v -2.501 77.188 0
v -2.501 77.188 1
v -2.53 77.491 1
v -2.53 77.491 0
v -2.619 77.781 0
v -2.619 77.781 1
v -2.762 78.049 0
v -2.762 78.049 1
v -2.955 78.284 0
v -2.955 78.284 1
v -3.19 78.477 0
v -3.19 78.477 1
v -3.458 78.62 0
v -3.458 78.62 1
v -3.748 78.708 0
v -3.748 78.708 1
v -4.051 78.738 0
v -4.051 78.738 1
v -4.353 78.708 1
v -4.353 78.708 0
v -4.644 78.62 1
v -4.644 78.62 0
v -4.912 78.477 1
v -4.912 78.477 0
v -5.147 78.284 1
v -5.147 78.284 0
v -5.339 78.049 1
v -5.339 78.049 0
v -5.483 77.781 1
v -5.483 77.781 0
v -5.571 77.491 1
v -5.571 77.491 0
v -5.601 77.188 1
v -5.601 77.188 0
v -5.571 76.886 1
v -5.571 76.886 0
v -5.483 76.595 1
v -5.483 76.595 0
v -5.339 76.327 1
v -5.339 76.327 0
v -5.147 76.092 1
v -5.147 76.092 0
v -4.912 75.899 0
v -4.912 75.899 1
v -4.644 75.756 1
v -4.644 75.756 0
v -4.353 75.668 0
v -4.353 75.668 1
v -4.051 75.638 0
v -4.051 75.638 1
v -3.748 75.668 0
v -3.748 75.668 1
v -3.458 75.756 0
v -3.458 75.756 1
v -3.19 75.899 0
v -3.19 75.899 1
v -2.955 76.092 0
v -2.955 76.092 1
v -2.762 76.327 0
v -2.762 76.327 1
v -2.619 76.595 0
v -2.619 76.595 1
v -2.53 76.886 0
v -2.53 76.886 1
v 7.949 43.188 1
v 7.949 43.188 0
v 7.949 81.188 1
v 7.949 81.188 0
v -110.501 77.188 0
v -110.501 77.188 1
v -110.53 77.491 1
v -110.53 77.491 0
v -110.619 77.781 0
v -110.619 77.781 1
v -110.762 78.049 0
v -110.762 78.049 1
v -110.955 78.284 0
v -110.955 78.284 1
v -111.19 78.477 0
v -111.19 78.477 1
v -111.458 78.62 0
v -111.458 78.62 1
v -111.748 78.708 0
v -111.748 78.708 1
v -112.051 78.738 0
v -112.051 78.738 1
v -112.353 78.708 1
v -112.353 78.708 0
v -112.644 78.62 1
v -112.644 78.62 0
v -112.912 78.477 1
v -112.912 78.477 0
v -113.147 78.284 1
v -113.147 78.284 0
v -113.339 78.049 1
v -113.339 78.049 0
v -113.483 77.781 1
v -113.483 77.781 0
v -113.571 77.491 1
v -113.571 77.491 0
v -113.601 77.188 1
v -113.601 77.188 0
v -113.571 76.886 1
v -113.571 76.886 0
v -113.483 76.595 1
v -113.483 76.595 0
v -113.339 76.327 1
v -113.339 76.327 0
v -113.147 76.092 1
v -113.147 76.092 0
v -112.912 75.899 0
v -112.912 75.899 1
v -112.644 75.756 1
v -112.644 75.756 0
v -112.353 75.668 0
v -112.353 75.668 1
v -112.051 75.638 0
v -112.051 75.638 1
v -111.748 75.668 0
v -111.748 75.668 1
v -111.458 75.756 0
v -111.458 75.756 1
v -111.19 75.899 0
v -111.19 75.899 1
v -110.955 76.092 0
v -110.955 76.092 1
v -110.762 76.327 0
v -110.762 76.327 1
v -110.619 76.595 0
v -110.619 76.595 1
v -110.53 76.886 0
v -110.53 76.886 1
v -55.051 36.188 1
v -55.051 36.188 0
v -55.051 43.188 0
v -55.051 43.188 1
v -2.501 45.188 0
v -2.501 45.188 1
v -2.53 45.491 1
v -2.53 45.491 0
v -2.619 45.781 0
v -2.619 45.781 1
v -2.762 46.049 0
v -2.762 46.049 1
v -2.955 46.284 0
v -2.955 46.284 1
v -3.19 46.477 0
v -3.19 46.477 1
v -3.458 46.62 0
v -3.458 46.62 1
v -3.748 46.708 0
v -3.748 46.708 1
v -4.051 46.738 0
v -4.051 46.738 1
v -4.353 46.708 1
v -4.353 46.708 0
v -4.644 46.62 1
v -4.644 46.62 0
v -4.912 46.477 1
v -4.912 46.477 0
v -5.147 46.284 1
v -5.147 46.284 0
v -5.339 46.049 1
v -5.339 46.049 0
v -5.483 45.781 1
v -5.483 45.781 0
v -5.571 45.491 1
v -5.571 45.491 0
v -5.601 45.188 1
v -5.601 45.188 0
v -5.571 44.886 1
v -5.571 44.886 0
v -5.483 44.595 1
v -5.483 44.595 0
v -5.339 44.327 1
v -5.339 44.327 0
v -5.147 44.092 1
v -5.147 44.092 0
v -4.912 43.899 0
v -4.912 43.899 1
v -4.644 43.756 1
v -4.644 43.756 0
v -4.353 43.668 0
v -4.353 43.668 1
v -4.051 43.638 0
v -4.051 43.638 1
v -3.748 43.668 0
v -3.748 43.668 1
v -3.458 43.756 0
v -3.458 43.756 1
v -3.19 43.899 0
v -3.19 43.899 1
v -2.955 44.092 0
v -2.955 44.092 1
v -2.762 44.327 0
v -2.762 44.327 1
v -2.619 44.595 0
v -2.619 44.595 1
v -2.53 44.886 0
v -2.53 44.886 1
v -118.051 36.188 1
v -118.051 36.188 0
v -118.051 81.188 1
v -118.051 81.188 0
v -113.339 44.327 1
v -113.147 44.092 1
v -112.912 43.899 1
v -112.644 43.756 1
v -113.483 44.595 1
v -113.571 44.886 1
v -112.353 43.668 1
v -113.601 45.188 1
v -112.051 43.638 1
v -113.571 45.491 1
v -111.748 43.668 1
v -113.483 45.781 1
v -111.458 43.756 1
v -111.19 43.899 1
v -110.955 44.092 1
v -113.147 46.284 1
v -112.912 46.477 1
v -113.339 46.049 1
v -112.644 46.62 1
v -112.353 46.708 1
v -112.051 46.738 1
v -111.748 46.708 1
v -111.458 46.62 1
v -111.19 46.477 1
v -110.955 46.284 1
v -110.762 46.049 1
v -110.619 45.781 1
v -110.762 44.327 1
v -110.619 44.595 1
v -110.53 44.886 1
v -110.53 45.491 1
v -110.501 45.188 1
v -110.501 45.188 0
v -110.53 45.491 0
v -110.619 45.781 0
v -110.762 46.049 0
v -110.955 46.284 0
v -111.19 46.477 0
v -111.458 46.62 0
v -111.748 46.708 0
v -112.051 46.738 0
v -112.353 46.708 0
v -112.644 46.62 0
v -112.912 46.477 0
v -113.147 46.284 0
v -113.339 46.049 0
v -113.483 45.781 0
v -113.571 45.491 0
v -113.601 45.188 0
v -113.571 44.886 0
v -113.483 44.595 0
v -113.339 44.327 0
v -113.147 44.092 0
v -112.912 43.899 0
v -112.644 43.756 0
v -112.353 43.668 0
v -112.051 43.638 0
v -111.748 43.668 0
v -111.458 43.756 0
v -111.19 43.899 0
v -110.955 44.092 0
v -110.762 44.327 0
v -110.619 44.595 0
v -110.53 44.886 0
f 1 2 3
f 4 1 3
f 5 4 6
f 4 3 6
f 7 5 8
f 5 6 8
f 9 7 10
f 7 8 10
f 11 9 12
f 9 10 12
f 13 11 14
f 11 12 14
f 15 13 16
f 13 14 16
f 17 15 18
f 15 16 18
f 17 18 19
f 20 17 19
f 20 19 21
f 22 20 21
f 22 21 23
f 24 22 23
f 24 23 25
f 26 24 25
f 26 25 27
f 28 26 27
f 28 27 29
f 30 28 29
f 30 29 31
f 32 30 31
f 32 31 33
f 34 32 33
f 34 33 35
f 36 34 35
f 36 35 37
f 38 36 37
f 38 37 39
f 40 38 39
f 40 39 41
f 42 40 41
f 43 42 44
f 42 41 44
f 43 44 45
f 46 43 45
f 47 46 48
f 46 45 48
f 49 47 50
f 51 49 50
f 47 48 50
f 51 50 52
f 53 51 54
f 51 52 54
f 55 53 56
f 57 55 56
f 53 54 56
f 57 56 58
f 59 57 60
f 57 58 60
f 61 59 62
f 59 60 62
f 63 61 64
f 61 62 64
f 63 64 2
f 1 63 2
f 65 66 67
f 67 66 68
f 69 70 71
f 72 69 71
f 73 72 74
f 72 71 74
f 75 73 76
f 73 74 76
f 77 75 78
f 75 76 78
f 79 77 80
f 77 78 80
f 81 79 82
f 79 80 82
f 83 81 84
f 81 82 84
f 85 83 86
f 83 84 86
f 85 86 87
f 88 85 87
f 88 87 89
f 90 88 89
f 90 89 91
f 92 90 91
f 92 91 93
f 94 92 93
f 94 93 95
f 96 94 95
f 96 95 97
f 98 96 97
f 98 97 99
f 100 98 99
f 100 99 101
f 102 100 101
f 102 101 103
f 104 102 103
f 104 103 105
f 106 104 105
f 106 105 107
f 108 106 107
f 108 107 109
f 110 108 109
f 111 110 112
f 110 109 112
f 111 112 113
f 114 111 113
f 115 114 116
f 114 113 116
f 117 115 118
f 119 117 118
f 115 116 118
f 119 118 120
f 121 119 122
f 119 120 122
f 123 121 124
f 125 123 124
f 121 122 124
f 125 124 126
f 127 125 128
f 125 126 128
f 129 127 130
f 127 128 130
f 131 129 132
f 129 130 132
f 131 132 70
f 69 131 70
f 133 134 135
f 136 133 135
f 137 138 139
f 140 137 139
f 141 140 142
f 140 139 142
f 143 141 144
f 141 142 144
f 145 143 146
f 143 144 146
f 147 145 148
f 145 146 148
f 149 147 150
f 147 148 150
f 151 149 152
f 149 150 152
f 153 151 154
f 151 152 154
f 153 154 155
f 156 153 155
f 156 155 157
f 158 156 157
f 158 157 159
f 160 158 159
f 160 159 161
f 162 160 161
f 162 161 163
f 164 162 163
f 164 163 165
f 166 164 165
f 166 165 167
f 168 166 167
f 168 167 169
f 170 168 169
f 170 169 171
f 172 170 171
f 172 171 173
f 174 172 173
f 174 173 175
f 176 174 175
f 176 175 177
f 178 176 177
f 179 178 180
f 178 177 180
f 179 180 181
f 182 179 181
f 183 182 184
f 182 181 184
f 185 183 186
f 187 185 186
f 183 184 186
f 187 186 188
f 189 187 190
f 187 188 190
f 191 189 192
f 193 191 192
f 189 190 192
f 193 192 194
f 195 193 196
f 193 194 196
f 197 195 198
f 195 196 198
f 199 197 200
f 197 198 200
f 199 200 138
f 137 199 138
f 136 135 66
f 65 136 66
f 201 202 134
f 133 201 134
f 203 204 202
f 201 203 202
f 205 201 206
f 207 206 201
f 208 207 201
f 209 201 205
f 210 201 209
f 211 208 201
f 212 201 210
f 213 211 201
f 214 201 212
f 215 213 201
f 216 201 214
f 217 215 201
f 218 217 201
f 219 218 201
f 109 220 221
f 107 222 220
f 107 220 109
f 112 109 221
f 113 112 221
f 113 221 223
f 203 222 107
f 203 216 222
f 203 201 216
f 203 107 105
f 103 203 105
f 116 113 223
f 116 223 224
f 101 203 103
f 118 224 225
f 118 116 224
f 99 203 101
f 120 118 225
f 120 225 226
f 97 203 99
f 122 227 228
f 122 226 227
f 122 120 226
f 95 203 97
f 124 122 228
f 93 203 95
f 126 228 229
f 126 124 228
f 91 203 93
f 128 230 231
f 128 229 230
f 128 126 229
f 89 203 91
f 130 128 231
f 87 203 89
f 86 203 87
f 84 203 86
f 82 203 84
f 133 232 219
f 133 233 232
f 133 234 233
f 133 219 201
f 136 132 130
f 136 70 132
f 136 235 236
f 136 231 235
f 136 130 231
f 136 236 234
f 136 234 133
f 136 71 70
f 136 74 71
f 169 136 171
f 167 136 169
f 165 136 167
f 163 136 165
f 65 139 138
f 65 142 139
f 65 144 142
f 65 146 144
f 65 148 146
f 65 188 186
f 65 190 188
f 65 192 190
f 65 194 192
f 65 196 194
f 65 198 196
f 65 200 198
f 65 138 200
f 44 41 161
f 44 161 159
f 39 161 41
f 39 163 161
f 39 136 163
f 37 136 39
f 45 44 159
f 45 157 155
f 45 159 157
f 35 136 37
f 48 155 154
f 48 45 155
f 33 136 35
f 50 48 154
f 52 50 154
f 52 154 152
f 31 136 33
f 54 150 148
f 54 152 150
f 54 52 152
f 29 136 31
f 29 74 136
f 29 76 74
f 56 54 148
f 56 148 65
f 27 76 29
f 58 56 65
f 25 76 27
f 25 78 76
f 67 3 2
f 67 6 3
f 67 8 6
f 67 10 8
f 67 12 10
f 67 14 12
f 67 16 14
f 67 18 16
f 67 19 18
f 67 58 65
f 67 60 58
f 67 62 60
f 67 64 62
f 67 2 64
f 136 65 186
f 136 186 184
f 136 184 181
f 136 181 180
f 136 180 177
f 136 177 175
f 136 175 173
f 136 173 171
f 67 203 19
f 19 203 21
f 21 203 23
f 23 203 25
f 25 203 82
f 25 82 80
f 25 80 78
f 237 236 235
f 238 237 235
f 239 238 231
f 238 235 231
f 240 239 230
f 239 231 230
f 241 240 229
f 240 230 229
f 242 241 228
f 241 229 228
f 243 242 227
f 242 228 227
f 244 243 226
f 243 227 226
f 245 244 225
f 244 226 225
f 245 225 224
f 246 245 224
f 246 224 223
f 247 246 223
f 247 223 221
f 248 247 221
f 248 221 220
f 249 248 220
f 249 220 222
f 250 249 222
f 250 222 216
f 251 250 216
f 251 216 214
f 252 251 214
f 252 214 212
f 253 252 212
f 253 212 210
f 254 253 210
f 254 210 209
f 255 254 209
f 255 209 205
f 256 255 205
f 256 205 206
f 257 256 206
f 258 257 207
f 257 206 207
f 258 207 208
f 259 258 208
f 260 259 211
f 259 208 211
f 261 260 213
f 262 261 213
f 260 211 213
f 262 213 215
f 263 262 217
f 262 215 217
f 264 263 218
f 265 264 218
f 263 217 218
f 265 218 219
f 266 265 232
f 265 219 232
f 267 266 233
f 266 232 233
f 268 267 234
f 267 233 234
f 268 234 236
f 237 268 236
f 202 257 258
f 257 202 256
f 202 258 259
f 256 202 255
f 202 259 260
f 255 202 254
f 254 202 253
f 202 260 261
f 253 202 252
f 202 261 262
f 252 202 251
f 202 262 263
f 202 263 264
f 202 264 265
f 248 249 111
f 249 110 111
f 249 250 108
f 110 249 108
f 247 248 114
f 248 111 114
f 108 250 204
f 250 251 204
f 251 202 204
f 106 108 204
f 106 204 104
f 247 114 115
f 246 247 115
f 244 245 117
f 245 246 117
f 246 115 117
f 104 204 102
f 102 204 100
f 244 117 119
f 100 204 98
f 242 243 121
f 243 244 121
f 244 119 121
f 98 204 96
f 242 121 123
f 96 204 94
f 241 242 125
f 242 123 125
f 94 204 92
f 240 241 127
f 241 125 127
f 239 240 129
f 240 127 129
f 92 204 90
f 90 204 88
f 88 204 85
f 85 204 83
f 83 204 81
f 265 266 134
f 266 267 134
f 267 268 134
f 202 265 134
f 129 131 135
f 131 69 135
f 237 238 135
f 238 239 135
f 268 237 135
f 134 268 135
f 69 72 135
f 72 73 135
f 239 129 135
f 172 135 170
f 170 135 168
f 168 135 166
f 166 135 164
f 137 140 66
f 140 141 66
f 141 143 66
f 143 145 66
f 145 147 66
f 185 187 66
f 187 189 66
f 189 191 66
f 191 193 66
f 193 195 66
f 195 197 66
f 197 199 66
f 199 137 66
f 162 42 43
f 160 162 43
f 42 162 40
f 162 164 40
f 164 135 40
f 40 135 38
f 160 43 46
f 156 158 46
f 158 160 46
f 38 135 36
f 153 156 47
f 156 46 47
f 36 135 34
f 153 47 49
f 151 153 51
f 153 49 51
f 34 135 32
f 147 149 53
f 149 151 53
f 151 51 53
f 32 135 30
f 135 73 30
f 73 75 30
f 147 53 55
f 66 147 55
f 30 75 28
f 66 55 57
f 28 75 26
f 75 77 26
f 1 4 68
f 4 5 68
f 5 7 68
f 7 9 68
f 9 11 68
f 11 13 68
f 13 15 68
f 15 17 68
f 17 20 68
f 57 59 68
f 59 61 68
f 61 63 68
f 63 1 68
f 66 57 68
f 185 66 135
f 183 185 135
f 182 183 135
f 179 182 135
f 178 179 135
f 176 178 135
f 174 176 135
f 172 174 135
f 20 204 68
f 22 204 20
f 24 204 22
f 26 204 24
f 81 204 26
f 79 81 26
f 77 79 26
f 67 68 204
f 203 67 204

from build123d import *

# Parameters (mm, degrees)
DODANIE_WYCI_GNI_CIE1_DEPTH = 1
SZKIC2_R                    = 1.55
WYTNIJ_WYCI_GNI_CIE1_DEPTH  = 10


with BuildPart() as part:
    # Szkic1 → Dodanie-wyciągnięcie1 (new body)
    with BuildSketch(Plane.XY):
        Polygon((-118.050662271, 36.18823203), (-55.050662271, 36.18823203), (-55.050662271, 43.18823203), (7.949337729, 43.18823203), (7.949337729, 81.18823203), (-118.050662271, 81.18823203), align=None)
    extrude(amount=DODANIE_WYCI_GNI_CIE1_DEPTH)

    # Szkic2 → Wytnij-wyciągnięcie1 (cut)
    with BuildSketch(Plane.XY.offset(1)):
        with Locations((-112.050662271, 77.18823203)):
            Circle(SZKIC2_R)
        with Locations((-112.050662271, 45.18823203)):
            Circle(SZKIC2_R)
        with Locations((-4.050662271, 77.18823203)):
            Circle(SZKIC2_R)
        with Locations((-4.050662271, 45.18823203)):
            Circle(SZKIC2_R)
    extrude(amount=-WYTNIJ_WYCI_GNI_CIE1_DEPTH, mode=Mode.SUBTRACT)


solid = part.part
